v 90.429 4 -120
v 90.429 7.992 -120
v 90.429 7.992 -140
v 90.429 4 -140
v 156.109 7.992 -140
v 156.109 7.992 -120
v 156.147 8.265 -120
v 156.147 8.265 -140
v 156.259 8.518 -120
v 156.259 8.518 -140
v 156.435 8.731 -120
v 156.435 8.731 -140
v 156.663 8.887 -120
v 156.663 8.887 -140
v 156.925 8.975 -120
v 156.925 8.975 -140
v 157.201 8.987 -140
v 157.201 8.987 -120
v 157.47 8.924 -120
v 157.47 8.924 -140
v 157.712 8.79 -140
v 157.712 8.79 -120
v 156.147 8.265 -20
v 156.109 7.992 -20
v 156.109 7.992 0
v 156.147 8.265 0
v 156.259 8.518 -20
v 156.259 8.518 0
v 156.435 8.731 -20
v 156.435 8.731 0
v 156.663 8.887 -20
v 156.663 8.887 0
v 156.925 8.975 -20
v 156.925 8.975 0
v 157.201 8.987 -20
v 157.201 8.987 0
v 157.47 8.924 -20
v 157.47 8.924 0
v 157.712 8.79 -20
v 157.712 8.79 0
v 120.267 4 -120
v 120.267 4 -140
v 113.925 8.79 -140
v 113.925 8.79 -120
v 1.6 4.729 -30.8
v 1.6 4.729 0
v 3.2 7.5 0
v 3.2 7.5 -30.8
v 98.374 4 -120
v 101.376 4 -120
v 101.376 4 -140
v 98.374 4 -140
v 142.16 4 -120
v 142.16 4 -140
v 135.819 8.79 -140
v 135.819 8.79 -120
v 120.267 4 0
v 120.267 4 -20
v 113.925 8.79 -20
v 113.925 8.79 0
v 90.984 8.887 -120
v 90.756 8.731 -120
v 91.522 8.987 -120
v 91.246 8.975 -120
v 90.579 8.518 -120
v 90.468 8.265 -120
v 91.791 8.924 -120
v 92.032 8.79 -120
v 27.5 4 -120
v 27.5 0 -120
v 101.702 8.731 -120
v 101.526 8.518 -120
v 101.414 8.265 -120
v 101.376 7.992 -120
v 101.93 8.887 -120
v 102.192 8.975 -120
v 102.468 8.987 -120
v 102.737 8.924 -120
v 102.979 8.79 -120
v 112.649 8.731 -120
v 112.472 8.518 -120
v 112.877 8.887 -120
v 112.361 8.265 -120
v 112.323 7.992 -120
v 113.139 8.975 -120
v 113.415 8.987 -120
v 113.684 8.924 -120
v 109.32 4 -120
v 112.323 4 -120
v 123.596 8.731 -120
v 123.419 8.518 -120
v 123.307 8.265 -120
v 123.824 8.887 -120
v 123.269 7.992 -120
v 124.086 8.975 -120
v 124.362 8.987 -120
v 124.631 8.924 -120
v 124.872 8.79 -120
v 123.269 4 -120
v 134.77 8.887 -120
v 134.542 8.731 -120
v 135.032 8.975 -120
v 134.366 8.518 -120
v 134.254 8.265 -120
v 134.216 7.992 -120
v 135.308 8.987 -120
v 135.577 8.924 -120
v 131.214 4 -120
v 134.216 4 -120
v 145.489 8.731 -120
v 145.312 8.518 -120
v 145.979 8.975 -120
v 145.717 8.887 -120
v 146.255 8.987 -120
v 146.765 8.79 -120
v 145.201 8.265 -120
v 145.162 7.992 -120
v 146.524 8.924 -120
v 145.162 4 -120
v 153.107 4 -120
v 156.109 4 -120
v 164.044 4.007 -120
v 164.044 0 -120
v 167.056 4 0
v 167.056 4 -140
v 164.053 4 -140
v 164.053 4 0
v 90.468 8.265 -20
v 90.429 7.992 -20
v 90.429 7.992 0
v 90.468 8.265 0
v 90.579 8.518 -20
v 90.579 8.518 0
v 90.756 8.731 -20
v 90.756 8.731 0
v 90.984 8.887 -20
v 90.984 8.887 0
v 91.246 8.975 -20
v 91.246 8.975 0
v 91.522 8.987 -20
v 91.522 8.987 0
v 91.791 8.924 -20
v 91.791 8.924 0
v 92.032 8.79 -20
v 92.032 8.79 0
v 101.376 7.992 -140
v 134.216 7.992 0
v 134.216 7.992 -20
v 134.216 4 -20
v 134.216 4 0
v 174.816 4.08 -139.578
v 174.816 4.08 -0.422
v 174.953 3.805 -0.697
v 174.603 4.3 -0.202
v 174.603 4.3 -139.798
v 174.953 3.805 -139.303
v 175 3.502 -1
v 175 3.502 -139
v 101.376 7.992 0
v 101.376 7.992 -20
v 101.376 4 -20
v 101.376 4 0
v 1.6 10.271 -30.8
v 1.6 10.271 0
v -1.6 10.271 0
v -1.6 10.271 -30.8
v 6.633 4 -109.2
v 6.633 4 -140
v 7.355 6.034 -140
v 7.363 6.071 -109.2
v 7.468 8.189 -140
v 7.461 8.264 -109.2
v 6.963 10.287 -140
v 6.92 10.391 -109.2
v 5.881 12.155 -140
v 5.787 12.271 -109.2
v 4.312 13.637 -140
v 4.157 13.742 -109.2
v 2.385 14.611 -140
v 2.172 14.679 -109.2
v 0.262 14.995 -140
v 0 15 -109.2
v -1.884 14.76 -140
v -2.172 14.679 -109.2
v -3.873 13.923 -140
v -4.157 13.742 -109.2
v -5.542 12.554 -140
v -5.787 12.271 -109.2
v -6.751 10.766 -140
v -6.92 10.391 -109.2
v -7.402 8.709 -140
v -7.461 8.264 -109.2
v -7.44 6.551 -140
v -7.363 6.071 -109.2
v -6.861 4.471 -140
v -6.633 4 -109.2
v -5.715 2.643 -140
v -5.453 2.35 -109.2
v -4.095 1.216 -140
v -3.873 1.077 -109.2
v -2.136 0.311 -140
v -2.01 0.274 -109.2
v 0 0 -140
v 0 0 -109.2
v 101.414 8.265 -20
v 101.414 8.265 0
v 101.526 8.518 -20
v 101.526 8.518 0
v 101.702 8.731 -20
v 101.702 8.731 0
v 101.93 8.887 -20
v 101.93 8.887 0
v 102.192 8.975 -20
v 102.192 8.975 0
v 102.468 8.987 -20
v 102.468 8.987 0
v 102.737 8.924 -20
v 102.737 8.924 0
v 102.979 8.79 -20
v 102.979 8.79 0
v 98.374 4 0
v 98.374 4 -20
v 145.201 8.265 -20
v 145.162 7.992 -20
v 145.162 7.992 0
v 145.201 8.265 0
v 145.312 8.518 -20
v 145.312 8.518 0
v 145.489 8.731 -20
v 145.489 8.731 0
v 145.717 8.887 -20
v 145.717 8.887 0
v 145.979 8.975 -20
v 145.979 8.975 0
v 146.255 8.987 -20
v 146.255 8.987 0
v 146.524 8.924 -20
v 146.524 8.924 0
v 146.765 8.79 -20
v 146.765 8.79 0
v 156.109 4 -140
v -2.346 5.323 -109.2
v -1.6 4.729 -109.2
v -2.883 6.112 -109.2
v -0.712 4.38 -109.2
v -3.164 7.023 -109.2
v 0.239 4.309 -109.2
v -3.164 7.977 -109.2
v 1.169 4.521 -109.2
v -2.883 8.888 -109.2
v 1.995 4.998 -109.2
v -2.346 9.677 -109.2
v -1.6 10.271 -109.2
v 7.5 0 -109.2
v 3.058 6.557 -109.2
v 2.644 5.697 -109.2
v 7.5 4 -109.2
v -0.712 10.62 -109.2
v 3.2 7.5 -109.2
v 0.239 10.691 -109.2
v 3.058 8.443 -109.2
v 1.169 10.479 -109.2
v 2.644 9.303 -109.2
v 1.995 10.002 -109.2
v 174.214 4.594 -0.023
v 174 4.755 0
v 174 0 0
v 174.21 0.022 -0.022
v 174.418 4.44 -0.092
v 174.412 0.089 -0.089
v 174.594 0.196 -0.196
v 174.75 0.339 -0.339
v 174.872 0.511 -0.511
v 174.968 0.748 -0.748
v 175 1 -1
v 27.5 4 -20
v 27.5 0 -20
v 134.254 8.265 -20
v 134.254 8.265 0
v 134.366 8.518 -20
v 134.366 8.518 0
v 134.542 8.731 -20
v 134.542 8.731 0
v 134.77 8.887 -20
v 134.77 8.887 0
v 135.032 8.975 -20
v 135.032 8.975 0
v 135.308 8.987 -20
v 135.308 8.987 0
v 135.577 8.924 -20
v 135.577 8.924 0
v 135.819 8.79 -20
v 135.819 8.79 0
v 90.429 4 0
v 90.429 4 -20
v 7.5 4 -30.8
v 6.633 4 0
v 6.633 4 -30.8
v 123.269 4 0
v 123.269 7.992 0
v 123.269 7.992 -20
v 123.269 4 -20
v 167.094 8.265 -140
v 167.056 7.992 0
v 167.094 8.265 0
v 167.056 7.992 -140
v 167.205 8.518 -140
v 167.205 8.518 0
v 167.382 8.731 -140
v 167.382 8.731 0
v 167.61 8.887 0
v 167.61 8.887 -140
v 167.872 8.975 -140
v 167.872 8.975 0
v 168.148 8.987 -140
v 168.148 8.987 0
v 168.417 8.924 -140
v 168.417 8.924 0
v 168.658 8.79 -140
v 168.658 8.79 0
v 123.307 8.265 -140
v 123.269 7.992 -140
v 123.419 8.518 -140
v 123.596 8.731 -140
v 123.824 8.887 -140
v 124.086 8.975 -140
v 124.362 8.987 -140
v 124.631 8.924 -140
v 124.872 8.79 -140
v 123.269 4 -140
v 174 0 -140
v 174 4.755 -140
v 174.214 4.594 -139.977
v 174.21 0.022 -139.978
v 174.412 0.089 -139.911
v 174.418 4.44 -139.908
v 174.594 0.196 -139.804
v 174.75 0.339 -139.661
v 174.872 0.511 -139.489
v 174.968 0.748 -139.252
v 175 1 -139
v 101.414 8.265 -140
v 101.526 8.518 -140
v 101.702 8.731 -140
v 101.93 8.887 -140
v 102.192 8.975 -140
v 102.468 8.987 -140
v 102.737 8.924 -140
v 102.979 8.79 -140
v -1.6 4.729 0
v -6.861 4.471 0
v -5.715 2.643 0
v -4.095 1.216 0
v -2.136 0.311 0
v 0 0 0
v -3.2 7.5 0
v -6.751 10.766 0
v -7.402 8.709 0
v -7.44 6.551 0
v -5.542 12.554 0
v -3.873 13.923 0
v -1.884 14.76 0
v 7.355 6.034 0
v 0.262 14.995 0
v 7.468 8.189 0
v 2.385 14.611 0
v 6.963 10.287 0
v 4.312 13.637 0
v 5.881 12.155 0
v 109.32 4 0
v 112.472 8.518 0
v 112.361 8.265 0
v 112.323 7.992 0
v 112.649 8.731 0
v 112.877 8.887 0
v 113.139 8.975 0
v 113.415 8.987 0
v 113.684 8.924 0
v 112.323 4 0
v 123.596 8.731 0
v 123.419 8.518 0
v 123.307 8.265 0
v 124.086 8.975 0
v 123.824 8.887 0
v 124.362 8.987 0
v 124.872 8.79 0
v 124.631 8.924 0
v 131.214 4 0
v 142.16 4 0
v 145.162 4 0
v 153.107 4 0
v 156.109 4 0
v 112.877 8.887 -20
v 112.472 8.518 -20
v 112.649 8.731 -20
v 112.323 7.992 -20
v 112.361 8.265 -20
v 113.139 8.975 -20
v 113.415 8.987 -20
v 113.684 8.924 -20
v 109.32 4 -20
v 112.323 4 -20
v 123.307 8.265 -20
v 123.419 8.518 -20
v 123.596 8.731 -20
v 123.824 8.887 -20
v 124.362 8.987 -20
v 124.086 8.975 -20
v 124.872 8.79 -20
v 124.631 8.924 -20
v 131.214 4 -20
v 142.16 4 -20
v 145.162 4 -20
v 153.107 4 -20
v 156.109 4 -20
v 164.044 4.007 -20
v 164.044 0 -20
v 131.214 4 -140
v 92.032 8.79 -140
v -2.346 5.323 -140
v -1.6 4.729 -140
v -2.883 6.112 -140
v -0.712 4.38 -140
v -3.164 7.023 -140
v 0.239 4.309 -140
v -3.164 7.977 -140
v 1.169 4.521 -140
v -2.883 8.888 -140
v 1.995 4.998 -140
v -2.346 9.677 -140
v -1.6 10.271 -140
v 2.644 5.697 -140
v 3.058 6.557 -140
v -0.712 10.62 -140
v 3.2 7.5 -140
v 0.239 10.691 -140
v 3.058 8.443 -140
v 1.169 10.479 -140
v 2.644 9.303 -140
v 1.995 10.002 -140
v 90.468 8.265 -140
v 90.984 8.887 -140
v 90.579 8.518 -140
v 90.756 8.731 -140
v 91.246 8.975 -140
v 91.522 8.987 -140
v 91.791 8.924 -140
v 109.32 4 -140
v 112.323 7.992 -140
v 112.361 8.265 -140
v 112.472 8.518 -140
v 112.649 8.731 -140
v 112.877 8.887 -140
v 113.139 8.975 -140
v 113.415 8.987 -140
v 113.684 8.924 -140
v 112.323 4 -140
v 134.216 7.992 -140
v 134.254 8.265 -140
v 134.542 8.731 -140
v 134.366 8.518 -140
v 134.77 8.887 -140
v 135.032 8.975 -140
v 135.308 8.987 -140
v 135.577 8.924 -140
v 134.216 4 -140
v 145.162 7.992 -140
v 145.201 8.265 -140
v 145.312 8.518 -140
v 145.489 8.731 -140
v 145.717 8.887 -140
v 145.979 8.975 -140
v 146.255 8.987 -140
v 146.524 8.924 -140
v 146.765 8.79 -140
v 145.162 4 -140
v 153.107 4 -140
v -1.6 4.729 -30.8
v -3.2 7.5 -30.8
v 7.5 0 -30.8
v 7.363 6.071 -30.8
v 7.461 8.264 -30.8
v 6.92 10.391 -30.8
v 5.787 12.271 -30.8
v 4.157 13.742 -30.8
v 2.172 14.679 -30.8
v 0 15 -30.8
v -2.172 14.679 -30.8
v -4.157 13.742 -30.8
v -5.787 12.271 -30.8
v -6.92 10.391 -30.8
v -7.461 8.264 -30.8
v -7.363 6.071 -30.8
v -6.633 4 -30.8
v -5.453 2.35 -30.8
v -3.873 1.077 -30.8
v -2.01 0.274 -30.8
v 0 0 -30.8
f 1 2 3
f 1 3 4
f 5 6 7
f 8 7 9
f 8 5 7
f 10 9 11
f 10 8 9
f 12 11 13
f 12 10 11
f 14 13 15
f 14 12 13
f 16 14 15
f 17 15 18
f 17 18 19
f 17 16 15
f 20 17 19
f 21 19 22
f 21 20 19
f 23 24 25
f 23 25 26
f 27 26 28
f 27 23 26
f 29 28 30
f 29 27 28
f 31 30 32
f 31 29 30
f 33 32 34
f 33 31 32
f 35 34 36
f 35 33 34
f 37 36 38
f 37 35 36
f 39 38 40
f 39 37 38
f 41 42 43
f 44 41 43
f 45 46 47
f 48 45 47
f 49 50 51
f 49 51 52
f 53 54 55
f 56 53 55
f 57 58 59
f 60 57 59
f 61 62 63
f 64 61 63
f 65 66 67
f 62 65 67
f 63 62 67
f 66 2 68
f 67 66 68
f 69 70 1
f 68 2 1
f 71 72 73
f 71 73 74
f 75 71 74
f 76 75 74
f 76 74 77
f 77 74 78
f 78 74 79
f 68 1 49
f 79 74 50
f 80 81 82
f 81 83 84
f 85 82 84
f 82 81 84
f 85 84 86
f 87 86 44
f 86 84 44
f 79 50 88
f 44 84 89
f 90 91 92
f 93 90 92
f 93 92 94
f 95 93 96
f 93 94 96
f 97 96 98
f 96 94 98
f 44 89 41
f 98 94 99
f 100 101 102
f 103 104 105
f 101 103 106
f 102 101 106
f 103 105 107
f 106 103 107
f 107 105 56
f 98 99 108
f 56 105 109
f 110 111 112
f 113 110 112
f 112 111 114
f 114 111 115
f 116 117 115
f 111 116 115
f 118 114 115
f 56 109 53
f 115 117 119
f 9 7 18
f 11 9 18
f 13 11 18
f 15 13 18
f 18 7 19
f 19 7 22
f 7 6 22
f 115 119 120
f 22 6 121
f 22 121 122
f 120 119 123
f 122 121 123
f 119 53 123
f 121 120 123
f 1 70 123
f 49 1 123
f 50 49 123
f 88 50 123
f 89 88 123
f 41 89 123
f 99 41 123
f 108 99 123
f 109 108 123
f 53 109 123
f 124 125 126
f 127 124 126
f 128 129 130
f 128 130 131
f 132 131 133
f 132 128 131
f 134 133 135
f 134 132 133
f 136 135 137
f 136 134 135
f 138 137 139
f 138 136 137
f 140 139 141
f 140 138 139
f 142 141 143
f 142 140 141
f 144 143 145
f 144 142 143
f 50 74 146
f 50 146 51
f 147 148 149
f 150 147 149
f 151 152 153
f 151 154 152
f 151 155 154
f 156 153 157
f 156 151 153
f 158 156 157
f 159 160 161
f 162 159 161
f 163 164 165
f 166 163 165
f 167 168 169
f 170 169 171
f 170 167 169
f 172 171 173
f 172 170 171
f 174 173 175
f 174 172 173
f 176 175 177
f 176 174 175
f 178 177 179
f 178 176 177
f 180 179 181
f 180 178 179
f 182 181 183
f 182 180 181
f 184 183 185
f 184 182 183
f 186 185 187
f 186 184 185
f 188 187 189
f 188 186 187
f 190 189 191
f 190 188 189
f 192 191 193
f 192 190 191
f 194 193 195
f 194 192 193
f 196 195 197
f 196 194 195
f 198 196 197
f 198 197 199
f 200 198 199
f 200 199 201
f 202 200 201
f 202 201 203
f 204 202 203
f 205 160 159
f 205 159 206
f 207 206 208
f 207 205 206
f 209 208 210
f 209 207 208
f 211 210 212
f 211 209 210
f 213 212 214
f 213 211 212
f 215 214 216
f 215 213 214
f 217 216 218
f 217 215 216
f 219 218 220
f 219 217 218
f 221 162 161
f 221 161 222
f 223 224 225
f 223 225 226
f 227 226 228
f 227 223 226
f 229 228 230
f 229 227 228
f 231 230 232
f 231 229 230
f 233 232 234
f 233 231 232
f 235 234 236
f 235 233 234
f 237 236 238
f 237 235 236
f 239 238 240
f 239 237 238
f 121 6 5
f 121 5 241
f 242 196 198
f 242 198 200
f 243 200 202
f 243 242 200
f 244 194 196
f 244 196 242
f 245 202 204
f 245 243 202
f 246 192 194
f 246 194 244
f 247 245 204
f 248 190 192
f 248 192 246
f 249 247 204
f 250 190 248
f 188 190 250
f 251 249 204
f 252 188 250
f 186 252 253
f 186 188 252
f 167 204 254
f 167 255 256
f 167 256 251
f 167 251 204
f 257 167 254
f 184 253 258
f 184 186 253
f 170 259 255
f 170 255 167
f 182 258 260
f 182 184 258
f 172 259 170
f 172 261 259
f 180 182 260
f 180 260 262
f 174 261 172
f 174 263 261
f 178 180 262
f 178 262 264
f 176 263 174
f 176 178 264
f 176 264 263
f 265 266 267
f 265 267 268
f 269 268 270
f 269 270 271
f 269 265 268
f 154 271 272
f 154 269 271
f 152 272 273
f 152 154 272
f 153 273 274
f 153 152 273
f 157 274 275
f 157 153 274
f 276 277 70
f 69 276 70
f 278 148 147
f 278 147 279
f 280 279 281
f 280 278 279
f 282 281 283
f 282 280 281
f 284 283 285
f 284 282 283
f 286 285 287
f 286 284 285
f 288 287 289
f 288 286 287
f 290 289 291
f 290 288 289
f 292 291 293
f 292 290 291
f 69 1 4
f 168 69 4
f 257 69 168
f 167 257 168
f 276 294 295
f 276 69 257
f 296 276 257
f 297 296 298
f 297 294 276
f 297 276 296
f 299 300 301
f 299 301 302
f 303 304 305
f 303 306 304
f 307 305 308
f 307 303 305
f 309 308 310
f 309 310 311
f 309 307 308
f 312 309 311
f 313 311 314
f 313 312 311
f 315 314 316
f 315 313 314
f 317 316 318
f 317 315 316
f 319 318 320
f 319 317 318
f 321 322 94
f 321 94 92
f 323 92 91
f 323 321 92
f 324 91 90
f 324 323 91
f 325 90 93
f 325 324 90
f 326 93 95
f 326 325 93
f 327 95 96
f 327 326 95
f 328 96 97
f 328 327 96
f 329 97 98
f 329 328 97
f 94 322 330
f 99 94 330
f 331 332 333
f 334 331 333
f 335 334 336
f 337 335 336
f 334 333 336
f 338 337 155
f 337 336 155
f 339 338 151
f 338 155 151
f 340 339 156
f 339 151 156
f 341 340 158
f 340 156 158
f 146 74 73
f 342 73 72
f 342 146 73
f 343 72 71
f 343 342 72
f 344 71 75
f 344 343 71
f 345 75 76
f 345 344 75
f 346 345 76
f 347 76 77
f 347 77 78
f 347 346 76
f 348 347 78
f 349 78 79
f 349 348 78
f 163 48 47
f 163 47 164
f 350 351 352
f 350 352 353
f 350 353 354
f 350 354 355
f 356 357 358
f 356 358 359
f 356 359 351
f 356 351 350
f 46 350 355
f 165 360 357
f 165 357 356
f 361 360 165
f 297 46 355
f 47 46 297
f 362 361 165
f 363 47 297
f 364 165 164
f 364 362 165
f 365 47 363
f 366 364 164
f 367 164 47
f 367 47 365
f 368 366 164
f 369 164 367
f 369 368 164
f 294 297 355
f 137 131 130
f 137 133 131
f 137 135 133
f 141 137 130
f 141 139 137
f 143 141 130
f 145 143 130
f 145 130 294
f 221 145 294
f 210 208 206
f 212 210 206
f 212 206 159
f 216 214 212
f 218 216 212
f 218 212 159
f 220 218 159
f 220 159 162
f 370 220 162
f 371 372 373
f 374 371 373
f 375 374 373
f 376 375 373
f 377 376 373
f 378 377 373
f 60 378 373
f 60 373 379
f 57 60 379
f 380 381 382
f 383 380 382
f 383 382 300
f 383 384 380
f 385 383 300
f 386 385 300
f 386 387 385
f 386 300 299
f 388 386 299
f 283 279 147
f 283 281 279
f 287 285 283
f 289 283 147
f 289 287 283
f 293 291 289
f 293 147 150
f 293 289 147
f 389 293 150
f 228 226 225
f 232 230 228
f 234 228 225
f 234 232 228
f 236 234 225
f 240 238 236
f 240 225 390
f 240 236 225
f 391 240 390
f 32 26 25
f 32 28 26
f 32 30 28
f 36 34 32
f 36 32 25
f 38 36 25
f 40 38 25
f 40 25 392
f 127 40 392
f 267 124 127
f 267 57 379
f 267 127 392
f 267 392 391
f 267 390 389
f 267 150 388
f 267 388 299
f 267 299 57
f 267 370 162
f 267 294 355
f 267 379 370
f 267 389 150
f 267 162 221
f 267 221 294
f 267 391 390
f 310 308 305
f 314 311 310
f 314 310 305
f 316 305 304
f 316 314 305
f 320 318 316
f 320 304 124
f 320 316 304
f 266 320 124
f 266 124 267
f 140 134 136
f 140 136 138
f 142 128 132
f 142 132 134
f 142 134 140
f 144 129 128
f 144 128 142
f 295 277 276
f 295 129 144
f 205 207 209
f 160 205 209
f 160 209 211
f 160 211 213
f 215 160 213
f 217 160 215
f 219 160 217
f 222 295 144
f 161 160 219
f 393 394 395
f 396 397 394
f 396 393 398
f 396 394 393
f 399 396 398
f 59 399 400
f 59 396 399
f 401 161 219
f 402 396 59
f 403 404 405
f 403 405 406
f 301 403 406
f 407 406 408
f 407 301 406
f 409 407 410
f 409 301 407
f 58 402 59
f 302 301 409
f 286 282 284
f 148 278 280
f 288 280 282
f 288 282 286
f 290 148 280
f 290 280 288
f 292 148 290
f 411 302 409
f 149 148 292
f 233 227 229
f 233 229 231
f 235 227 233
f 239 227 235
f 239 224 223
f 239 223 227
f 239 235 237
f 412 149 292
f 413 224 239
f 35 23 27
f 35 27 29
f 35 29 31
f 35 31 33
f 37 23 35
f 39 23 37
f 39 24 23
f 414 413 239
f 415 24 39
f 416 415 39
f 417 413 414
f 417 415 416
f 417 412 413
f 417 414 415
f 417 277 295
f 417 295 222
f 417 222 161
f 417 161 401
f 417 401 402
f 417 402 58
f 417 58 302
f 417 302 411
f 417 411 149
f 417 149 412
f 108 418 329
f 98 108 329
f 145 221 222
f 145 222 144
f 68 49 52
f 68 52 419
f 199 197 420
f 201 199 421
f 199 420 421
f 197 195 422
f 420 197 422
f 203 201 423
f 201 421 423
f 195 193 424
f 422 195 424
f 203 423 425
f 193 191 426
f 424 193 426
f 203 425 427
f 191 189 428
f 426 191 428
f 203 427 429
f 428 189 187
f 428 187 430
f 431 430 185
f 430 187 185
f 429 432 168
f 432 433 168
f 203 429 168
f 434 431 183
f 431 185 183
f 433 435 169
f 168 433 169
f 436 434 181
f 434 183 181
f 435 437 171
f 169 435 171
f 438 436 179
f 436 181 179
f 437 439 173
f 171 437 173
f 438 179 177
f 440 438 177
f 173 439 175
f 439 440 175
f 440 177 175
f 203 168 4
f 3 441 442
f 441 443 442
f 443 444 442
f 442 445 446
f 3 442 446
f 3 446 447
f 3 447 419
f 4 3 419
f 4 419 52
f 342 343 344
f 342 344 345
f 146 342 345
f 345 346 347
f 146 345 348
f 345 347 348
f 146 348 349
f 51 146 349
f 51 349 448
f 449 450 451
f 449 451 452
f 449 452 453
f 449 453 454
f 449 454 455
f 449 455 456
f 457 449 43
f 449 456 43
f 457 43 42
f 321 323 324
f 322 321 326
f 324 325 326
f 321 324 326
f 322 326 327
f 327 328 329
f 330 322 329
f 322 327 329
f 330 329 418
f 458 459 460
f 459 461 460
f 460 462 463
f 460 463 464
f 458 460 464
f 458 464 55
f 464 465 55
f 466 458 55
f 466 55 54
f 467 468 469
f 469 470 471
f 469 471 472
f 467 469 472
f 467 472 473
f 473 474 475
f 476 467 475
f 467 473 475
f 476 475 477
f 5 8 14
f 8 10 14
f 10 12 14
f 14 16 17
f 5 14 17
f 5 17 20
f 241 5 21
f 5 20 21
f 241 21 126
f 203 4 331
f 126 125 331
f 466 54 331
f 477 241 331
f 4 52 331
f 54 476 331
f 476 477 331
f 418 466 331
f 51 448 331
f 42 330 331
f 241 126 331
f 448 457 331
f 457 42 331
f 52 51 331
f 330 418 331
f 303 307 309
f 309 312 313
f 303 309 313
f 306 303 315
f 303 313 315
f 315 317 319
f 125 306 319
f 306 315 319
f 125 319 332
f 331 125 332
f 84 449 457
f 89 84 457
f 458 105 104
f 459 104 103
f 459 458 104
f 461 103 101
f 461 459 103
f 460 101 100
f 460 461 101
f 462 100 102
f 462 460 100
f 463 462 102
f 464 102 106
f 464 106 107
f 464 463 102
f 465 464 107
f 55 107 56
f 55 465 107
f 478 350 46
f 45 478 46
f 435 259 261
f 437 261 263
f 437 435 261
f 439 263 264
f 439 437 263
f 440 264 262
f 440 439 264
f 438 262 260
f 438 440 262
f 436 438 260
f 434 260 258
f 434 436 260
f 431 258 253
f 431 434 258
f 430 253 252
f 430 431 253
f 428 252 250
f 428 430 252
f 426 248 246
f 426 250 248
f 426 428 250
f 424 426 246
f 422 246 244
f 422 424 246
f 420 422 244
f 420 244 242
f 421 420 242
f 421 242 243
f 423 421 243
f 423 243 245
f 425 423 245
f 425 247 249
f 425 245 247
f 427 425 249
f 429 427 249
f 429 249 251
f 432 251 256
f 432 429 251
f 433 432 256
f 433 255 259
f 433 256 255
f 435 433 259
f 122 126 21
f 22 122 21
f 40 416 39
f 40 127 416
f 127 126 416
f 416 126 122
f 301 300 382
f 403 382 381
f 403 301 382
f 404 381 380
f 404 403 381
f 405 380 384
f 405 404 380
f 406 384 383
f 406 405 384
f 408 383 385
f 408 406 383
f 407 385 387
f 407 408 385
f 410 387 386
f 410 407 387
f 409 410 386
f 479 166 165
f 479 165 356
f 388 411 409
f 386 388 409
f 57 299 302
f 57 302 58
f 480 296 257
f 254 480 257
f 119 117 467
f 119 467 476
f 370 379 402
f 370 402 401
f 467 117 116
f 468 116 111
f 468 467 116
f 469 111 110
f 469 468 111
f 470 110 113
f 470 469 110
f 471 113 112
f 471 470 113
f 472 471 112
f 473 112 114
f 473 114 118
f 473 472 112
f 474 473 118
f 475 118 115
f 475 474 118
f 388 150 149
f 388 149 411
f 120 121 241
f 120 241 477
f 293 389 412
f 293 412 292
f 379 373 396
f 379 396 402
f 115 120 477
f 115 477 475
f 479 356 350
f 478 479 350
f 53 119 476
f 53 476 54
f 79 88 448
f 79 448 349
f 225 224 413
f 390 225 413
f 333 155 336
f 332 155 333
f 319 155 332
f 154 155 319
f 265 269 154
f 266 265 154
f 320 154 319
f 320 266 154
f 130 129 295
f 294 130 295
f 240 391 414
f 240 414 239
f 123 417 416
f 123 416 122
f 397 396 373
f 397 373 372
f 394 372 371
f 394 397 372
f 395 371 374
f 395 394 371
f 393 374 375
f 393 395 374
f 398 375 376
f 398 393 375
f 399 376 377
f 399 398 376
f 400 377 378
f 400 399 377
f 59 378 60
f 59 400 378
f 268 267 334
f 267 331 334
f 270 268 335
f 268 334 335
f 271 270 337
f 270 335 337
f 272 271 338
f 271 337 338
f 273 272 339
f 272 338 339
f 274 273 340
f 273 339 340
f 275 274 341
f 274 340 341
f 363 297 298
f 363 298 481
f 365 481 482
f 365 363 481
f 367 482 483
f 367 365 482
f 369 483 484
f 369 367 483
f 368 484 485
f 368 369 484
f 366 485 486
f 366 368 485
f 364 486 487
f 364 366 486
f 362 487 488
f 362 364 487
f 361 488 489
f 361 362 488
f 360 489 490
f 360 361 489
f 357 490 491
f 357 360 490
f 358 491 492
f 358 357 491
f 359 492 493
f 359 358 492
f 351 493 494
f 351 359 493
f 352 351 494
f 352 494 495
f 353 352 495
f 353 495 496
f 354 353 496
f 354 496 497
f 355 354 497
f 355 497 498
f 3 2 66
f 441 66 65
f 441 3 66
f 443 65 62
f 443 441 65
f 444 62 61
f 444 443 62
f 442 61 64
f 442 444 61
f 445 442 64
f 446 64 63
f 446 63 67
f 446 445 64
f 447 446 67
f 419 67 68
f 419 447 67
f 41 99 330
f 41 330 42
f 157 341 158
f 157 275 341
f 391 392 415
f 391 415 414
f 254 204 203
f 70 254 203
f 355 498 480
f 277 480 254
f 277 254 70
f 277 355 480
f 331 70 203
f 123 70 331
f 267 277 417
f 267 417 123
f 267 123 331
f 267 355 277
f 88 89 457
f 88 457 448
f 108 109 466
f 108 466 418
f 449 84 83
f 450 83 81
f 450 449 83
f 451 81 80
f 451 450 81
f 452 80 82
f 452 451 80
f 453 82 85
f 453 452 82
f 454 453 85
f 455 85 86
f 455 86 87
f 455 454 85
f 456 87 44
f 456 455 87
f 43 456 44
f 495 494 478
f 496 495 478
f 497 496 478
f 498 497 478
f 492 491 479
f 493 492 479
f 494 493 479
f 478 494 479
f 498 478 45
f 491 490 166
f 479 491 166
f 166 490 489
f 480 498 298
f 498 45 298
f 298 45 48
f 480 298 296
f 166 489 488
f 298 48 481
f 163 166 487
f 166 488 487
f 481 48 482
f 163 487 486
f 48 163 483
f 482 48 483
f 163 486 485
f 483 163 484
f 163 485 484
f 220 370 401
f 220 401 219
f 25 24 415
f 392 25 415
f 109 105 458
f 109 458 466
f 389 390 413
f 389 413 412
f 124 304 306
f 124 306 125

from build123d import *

# Parameters (mm, degrees)
EXTRUDE_1_DEPTH          = 140
CUT_EXTRUDE_1_DEPTH      = 20
CUT_EXTRUDE_1_DEPTH_BACK = 20
SKETCH_2_W               = 78.4
SKETCH_2_H               = 11
CUT_EXTRUDE_2_DEPTH      = 78.4
CUT_EXTRUDE_2_DEPTH_BACK = 207.820308481
SKETCH_3_R               = 3.2
FILLET_1_R               = 1
SKETCH_4_W               = 14.133249581
SKETCH_4_H               = 78.4
CUT_EXTRUDE_3_DEPTH      = 225.379143416
CUT_EXTRUDE_4_DEPTH      = 225.379143416
CUT_EXTRUDE_4_DEPTH_BACK = 225.379143416
SKETCH_5_W               = 136.544306781
SKETCH_5_H               = 100


with BuildPart() as part:
    # 草图1 → 凸台-拉伸1 (new body)
    with BuildSketch(Plane.XY):
        with BuildLine():
            Line((0, 0), (175, 0))
            Line((175, 0), (175, 4))
            Line((175, 4), (167.055676963, 10))
            Line((167.055676963, 10), (167.055676963, 4))
            Line((167.055676963, 4), (164.053399387, 4))
            Line((164.053399387, 4), (156.10907635, 10))
            Line((156.10907635, 10), (156.10907635, 4))
            Line((156.10907635, 4), (153.106798774, 4))
            Line((153.106798774, 4), (145.162475737, 10))
            Line((145.162475737, 10), (145.162475737, 4))
            Line((145.162475737, 4), (142.160198161, 4))
            Line((142.160198161, 4), (134.215875124, 10))
            Line((134.215875124, 10), (134.215875124, 4))
            Line((134.215875124, 4), (131.213597548, 4))
            Line((131.213597548, 4), (123.269274511, 10))
            Line((123.269274511, 10), (123.269274511, 4))
            Line((123.269274511, 4), (120.266996935, 4))
            Line((120.266996935, 4), (112.322673898, 10))
            Line((112.322673898, 10), (112.322673898, 4))
            Line((112.322673898, 4), (109.320396322, 4))
            Line((109.320396322, 4), (101.376073285, 10))
            Line((101.376073285, 10), (101.376073285, 4))
            Line((101.376073285, 4), (98.373795709, 4))
            Line((98.373795709, 4), (90.429472672, 10))
            Line((90.429472672, 10), (90.429472672, 4))
            Line((90.429472672, 4), (72.427195096, 4))
            Line((72.427195096, 4), (65.557646205, 4))
            Line((65.557646205, 4), (61.480594483, 4))
            Line((61.480594483, 4), (54.611045592, 4))
            Line((54.611045592, 4), (6.633249581, 4))
            ThreePointArc((6.633249581, 4), (-3.872983346, 13.922616289), (0, 0))
        make_face()
        Polygon((3.2, 7.5), (1.6, 10.271281292), (-1.6, 10.271281292), (-3.2, 7.5), (-1.6, 4.728718708), (1.6, 4.728718708), align=None, mode=Mode.SUBTRACT)
    extrude(amount=-EXTRUDE_1_DEPTH)

    # 草图2 → 切除-拉伸1 (cut, two sides: drawn at the far end of the back side and taken through both)
    with BuildSketch(Plane(origin=(0, 0, 0), x_dir=(0, 0, -1), z_dir=(1, 0, 0)).offset(-CUT_EXTRUDE_1_DEPTH_BACK)):
        with Locations((70, 9.5)):
            Rectangle(SKETCH_2_W, SKETCH_2_H)
    extrude(amount=CUT_EXTRUDE_1_DEPTH + CUT_EXTRUDE_1_DEPTH_BACK, mode=Mode.SUBTRACT)

    # 草图3 → 切除-拉伸2 (cut, two sides: drawn at the far end of the back side and taken through both)
    with BuildSketch(Plane.XY.offset(-109.2).offset(-CUT_EXTRUDE_2_DEPTH_BACK)):
        with Locations((0, 7.5)):
            Circle(SKETCH_3_R)
    extrude(amount=CUT_EXTRUDE_2_DEPTH + CUT_EXTRUDE_2_DEPTH_BACK, mode=Mode.SUBTRACT)

    # 圆角1
    fillet_1_edges = [part.edges().sort_by_distance(p)[0] for p in [
        (175, 2, -140),
        (175, 2, 0),
        (90.429472672, 10, -70),
        (101.376073285, 10, -70),
        (112.322673898, 10, -70),
        (123.269274511, 10, -70),
        (134.215875124, 10, -70),
        (145.162475737, 10, -70),
        (156.10907635, 10, -70),
        (167.055676963, 10, -70),
        (175, 4, -70),
        (175, 0, -70),
    ]]
    fillet(fillet_1_edges, radius=FILLET_1_R)

    # 草图4 → 切除-拉伸3 (cut, through all)
    with BuildSketch(Plane(origin=(0, 4, 0), x_dir=(1, 0, 0), z_dir=(0, 1, 0))):
        with Locations((0.43337521, 70)):
            Rectangle(SKETCH_4_W, SKETCH_4_H)
    extrude(amount=-CUT_EXTRUDE_3_DEPTH, mode=Mode.SUBTRACT)

    # 草图5 → 切除-拉伸4 (cut, two sides: drawn at the far end of the back side and taken through both)
    with BuildSketch(Plane(origin=(0, 4, 0), x_dir=(1, 0, 0), z_dir=(0, 1, 0)).offset(-CUT_EXTRUDE_4_DEPTH_BACK)):
        with Locations((95.772153391, 70)):
            Rectangle(SKETCH_5_W, SKETCH_5_H)
    extrude(amount=CUT_EXTRUDE_4_DEPTH + CUT_EXTRUDE_4_DEPTH_BACK, mode=Mode.SUBTRACT)


solid = part.part
